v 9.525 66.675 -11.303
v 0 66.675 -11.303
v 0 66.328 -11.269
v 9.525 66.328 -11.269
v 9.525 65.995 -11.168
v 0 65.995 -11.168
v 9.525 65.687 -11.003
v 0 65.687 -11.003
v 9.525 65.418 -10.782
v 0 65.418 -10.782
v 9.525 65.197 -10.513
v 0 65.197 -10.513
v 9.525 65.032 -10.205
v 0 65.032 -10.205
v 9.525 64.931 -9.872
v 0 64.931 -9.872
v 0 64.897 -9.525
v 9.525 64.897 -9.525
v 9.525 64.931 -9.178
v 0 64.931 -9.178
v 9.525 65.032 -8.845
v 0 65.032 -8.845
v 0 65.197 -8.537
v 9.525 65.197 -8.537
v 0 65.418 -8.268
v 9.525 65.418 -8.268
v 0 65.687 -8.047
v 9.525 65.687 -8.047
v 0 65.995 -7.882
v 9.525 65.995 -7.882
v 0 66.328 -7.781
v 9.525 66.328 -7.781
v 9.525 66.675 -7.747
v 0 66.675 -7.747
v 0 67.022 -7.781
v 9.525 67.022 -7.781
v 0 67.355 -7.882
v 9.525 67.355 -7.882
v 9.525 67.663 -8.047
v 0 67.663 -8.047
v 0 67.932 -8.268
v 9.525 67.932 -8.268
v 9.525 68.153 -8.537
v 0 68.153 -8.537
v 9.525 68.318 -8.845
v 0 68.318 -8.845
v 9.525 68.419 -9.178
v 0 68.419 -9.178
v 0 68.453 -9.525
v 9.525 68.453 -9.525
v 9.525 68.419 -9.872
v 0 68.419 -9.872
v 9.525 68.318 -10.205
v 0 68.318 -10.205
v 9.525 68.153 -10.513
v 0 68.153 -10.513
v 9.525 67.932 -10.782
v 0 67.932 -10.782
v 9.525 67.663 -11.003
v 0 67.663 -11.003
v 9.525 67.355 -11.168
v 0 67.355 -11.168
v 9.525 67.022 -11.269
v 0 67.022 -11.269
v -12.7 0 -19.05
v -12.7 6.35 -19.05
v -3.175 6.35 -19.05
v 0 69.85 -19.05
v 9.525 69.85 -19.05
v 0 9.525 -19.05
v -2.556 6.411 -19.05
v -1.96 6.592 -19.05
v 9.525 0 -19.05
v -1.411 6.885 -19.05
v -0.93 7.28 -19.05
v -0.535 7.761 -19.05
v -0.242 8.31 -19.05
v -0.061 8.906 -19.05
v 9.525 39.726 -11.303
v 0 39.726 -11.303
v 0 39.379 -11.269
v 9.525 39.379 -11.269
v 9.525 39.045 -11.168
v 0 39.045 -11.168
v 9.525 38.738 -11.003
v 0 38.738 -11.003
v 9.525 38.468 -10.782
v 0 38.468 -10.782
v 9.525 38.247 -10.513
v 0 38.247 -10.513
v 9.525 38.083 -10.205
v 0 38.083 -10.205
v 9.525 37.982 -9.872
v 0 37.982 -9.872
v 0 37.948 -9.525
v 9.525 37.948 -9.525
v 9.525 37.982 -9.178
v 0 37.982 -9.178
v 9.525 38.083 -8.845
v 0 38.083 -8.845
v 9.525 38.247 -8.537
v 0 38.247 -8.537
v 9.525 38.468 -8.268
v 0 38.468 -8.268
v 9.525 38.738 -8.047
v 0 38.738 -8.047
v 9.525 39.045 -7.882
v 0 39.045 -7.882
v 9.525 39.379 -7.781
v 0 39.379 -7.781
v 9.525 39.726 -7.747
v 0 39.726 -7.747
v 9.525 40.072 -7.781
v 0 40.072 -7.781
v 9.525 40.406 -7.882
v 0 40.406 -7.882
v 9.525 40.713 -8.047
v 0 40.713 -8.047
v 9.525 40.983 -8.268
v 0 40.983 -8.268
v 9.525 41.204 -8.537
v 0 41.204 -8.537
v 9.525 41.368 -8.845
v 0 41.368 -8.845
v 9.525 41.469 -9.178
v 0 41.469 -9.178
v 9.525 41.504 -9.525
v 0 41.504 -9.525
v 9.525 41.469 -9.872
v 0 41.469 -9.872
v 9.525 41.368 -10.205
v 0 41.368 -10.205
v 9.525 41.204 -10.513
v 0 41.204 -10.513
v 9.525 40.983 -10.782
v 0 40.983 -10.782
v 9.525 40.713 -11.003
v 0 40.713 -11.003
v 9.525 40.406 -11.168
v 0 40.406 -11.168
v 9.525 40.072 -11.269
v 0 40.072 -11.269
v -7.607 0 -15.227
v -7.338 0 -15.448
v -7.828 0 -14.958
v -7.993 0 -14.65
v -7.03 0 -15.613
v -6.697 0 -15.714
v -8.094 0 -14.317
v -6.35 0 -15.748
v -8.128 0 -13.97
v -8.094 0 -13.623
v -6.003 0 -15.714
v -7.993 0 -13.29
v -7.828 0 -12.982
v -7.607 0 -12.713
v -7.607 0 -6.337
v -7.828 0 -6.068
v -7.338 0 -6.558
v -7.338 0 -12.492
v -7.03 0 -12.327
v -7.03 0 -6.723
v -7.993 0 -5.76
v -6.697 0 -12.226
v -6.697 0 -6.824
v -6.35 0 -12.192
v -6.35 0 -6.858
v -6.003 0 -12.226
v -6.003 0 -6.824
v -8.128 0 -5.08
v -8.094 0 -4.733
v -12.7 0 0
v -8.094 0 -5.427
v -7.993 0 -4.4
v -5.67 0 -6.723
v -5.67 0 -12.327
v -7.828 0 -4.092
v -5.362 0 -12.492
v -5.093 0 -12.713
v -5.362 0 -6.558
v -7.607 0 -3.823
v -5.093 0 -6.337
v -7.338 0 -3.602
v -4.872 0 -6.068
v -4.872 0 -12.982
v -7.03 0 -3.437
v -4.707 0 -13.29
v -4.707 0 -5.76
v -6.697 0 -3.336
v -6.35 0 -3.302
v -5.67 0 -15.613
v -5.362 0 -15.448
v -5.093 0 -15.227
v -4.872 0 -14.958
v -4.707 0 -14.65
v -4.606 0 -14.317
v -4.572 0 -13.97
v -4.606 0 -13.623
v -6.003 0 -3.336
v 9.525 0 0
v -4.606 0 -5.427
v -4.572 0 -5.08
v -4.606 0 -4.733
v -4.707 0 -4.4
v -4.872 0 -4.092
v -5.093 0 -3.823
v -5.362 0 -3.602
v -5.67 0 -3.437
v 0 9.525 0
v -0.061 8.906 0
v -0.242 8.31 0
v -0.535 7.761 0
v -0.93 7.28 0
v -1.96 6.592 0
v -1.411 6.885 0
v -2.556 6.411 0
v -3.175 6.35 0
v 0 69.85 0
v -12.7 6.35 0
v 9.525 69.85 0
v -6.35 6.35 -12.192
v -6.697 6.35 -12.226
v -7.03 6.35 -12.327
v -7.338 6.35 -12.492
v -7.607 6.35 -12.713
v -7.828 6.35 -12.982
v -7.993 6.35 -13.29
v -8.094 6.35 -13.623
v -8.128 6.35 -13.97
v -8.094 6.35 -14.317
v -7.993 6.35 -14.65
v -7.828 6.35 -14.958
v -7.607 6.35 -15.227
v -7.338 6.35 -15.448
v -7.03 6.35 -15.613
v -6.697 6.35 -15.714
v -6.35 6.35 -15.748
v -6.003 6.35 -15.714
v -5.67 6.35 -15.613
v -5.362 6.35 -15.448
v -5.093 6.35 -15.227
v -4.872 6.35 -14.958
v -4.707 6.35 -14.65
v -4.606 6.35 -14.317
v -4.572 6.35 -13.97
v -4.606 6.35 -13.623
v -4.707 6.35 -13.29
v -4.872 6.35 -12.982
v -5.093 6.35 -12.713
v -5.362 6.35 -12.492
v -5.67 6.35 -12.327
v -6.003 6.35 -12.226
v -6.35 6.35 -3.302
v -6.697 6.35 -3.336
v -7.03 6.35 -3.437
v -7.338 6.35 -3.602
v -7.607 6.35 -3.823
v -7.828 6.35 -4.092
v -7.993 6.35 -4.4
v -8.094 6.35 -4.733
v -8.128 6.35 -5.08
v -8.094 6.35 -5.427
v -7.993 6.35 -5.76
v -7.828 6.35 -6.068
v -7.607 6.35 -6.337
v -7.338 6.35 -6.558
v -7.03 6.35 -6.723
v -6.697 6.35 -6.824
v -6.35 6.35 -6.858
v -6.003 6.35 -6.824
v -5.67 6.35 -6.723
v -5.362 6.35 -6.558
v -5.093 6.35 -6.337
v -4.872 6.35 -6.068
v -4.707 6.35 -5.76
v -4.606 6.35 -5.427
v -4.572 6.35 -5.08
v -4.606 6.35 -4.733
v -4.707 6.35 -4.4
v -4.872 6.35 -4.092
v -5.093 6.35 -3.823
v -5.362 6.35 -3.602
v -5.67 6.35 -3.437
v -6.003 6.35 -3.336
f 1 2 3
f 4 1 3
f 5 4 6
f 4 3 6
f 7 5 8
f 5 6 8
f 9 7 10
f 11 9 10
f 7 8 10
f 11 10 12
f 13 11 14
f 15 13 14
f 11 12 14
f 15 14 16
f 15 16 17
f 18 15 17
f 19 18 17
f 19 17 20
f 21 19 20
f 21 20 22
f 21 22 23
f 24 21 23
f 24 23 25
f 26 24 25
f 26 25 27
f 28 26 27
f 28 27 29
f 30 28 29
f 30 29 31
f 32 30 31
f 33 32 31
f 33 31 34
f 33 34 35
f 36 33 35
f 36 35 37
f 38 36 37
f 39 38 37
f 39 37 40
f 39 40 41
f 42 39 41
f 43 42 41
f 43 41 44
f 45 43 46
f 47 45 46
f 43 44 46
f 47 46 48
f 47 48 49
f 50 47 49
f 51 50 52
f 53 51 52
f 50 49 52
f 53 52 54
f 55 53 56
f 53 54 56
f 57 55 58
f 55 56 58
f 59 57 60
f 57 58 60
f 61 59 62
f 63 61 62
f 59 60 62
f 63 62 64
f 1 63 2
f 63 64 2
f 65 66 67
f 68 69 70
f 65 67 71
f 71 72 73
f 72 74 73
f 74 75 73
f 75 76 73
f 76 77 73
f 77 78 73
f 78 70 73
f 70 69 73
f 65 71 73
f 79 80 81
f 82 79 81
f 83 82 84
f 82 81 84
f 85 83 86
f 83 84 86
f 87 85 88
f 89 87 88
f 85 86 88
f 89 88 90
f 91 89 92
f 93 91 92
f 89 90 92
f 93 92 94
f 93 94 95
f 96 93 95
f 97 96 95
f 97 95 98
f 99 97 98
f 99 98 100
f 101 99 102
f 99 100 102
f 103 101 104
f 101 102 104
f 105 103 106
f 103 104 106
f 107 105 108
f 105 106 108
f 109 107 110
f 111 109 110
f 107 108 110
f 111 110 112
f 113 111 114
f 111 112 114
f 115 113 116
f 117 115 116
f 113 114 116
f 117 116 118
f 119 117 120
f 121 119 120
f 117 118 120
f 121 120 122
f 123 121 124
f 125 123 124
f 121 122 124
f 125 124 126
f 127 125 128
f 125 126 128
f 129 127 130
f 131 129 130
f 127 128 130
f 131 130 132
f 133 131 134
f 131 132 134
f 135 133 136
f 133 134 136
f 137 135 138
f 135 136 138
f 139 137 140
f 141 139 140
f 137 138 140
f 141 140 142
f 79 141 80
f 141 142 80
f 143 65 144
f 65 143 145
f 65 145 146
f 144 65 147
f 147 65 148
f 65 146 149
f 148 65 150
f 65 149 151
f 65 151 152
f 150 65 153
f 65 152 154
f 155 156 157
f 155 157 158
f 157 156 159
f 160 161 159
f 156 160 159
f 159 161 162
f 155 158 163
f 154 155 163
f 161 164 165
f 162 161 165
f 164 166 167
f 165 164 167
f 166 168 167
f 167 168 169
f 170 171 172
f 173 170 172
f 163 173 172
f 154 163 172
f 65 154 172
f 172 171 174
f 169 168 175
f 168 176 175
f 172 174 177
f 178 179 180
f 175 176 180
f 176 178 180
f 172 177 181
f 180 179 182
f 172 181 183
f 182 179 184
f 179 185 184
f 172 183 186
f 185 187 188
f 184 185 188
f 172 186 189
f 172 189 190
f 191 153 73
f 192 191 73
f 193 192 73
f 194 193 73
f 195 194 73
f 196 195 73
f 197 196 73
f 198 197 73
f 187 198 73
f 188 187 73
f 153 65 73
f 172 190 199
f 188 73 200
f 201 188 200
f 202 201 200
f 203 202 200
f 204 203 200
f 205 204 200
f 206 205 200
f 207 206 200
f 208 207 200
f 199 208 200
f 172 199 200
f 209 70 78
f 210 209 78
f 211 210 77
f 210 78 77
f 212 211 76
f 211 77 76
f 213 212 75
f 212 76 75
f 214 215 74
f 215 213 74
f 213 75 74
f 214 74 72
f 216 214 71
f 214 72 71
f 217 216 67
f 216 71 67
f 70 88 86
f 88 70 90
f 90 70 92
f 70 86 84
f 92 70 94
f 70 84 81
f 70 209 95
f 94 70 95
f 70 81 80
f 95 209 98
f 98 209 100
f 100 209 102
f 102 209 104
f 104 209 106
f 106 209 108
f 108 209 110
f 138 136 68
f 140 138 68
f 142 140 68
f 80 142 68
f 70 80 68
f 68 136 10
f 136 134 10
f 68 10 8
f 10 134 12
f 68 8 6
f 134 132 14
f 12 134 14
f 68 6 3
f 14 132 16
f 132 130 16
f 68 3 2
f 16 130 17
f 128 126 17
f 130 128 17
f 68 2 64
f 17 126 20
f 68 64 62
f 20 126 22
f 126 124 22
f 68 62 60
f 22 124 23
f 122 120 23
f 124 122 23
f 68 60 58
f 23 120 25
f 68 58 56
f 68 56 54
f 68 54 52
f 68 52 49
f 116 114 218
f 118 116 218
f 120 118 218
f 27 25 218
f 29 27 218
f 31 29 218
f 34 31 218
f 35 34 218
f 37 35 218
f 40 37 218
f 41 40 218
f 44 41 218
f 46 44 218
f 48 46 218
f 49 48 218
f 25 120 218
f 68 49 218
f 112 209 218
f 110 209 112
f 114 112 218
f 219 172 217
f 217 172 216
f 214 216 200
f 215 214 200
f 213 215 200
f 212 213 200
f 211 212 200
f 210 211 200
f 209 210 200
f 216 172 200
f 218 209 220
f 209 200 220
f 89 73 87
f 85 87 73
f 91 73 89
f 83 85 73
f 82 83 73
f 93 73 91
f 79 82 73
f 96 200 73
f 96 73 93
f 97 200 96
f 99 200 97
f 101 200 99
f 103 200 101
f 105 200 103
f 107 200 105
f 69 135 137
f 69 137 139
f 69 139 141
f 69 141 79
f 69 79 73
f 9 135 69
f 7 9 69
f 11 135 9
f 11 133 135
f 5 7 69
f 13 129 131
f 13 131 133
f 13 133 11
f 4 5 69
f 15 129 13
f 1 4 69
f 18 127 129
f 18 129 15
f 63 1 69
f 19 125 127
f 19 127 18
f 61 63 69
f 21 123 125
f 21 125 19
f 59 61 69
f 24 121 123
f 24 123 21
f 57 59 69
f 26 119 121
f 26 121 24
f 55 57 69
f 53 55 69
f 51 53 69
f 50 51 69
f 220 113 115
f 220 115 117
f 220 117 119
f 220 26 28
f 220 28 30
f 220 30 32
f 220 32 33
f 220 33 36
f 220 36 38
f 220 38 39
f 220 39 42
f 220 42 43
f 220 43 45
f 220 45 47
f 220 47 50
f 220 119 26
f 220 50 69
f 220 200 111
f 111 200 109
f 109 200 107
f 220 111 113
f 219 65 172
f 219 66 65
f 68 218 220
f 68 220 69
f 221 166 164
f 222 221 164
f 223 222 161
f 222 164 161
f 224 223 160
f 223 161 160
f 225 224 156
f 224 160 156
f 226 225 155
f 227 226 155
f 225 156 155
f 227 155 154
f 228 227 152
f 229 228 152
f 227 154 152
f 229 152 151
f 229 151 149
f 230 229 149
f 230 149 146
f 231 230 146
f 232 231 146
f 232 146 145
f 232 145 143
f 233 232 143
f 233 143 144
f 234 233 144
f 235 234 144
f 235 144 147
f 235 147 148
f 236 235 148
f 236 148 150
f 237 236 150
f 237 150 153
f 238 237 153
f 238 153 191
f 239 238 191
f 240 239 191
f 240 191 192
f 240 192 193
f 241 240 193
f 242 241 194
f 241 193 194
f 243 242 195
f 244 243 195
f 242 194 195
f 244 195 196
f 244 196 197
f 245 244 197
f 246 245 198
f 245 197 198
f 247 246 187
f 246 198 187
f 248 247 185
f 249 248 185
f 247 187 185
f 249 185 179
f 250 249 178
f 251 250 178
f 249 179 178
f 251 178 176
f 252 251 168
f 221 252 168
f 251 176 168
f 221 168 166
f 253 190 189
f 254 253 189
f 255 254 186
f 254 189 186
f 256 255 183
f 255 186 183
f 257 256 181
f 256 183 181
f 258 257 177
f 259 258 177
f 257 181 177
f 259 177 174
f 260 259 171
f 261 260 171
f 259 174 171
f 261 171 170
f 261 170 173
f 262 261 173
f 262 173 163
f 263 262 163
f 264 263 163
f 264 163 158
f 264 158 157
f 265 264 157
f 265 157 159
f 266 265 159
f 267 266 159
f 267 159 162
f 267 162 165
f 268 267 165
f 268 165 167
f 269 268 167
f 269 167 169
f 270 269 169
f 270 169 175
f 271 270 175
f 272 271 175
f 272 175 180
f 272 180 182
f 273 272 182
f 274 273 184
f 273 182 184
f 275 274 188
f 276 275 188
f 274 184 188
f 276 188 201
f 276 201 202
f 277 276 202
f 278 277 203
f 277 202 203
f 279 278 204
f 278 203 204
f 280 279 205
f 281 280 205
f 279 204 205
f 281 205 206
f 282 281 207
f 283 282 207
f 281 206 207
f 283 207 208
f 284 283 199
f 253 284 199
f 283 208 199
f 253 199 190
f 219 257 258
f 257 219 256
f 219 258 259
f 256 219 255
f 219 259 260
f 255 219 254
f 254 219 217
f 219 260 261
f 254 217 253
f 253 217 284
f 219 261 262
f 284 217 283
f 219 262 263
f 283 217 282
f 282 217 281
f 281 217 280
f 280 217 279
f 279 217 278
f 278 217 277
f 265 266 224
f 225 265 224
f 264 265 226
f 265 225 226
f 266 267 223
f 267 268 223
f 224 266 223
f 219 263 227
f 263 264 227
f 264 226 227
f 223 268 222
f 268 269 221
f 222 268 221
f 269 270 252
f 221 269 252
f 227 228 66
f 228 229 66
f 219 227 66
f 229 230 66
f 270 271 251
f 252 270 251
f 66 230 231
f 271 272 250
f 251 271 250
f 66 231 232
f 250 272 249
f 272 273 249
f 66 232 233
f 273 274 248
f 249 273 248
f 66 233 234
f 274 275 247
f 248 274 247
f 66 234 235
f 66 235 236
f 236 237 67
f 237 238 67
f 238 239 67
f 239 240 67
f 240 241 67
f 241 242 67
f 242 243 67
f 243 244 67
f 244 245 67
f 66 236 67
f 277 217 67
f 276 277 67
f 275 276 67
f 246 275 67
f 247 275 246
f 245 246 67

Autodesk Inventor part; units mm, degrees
ref_plane "YZ Plane" through (0, 0, 0) normal (1, 0, 0) x (0, 1, 0)
ref_plane "XZ Plane" through (0, 0, 0) normal (0, 1, 0) x (-1, 0, 0)
ref_plane "XY Plane" through (0, 0, 0) normal (0, 0, 1) x (1, 0, 0)
sketch "Sketch1" plane through (0, 0, 0) normal (1, 0, 0) x (0, 1, 0)
  line L0 (0, 0) -> (69.85, 0)
  line L1 (69.85, 0) -> (69.85, -19.05)
  line L2 (69.85, -19.05) -> (0, -19.05)
  line L3 (0, -19.05) -> (0, 0)
  dimension "d0" = 19.05
  dimension "d1" = 69.85
extrude "Extrusion1" add sketch "Sketch1" along normal blind 9.525
sketch "Sketch2" plane through (9.525, 0, 0) normal (1, 0, 0) x (0, 0, -1)
  line L0 (0, 69.85) -> (0, 0) projected
  line L1 (0, 0) -> (19.05, 0) projected
  line L2 (19.05, 0) -> (19.05, 69.85) projected
  line L3 (19.05, 69.85) -> (0, 69.85) projected
  point P0 (9.525, 66.675)
  point P1 (9.525, 39.7256)
  dimension "d4" = 26.9494
  dimension "d5" = 19.05
  dimension "d6" = 69.85
  dimension "d7" = 3.175
  dimension "d8" = 9.525
  dimension "d9" = 9.525
hole "Hole1" at (9.525, 66.675, -9.525) at (9.525, 39.7256, -9.525) direction (-1, 0, 0) diameter 3.556 depth 25.4 tip angle 118
sketch "Sketch5" plane through (0, 0, 0) normal (-1, 0, 0) x (0, 0, 1)
  circle A0 centre (-9.525, 66.675) radius 1.778 projected
  circle A1 centre (-9.525, 39.7256) radius 1.778 projected
  line L0 (0, 0) -> (0, 69.85) projected
  line L1 (0, 69.85) -> (-19.05, 69.85) projected
  line L2 (-19.05, 69.85) -> (-19.05, 0) projected
  line L3 (-19.05, 0) -> (0, 0) projected
  line L4 (-19.05, 0) -> (-19.05, 69.85) projected
  line L5 (0, 69.85) -> (0, 0) projected
  line L6 (-19.05, 0) -> (0, 0)
  line L7 (0, 0) -> (0, 6.35)
  line L8 (0, 6.35) -> (-19.05, 6.35)
  line L9 (-19.05, 6.35) -> (-19.05, 0)
  dimension "d31" = 6.35
extrude "Extrusion2" add sketch "Sketch5" along normal blind 12.7 contours L3 L2 L8 L0
sketch "Sketch6" plane through (0, 6.35, 0) normal (0, 1, 0) x (1, 0, 0)
  line L0 (0, 19.05) -> (0, 0) projected
  line L1 (0, 19.05) -> (-12.7, 19.05) projected
  line L2 (-12.7, 0) -> (-12.7, 19.05) projected
  line L3 (0, 0) -> (-12.7, 0) projected
  point P0 (0, 0)
  point P1 (-6.35, 13.97)
  point P2 (-6.35, 5.08)
  dimension "d34" = 19.05
  dimension "d35" = 5.08
  dimension "d36" = 5.08
hole "Hole3" at (-6.35, 6.35, -13.97) at (-6.35, 6.35, -5.08) direction (0, -1, 0) diameter 3.556 depth 25.4 tip angle 118
fillet "Fillet1" radius 3.175 1 edges at (0, 6.35, -9.525)
equation "\"d8\" = 0.5 * d5"
equation "\"d9\" = d8"
equation "\"d36\" = d35"
properties part number "GlyphtMotorBrace"
